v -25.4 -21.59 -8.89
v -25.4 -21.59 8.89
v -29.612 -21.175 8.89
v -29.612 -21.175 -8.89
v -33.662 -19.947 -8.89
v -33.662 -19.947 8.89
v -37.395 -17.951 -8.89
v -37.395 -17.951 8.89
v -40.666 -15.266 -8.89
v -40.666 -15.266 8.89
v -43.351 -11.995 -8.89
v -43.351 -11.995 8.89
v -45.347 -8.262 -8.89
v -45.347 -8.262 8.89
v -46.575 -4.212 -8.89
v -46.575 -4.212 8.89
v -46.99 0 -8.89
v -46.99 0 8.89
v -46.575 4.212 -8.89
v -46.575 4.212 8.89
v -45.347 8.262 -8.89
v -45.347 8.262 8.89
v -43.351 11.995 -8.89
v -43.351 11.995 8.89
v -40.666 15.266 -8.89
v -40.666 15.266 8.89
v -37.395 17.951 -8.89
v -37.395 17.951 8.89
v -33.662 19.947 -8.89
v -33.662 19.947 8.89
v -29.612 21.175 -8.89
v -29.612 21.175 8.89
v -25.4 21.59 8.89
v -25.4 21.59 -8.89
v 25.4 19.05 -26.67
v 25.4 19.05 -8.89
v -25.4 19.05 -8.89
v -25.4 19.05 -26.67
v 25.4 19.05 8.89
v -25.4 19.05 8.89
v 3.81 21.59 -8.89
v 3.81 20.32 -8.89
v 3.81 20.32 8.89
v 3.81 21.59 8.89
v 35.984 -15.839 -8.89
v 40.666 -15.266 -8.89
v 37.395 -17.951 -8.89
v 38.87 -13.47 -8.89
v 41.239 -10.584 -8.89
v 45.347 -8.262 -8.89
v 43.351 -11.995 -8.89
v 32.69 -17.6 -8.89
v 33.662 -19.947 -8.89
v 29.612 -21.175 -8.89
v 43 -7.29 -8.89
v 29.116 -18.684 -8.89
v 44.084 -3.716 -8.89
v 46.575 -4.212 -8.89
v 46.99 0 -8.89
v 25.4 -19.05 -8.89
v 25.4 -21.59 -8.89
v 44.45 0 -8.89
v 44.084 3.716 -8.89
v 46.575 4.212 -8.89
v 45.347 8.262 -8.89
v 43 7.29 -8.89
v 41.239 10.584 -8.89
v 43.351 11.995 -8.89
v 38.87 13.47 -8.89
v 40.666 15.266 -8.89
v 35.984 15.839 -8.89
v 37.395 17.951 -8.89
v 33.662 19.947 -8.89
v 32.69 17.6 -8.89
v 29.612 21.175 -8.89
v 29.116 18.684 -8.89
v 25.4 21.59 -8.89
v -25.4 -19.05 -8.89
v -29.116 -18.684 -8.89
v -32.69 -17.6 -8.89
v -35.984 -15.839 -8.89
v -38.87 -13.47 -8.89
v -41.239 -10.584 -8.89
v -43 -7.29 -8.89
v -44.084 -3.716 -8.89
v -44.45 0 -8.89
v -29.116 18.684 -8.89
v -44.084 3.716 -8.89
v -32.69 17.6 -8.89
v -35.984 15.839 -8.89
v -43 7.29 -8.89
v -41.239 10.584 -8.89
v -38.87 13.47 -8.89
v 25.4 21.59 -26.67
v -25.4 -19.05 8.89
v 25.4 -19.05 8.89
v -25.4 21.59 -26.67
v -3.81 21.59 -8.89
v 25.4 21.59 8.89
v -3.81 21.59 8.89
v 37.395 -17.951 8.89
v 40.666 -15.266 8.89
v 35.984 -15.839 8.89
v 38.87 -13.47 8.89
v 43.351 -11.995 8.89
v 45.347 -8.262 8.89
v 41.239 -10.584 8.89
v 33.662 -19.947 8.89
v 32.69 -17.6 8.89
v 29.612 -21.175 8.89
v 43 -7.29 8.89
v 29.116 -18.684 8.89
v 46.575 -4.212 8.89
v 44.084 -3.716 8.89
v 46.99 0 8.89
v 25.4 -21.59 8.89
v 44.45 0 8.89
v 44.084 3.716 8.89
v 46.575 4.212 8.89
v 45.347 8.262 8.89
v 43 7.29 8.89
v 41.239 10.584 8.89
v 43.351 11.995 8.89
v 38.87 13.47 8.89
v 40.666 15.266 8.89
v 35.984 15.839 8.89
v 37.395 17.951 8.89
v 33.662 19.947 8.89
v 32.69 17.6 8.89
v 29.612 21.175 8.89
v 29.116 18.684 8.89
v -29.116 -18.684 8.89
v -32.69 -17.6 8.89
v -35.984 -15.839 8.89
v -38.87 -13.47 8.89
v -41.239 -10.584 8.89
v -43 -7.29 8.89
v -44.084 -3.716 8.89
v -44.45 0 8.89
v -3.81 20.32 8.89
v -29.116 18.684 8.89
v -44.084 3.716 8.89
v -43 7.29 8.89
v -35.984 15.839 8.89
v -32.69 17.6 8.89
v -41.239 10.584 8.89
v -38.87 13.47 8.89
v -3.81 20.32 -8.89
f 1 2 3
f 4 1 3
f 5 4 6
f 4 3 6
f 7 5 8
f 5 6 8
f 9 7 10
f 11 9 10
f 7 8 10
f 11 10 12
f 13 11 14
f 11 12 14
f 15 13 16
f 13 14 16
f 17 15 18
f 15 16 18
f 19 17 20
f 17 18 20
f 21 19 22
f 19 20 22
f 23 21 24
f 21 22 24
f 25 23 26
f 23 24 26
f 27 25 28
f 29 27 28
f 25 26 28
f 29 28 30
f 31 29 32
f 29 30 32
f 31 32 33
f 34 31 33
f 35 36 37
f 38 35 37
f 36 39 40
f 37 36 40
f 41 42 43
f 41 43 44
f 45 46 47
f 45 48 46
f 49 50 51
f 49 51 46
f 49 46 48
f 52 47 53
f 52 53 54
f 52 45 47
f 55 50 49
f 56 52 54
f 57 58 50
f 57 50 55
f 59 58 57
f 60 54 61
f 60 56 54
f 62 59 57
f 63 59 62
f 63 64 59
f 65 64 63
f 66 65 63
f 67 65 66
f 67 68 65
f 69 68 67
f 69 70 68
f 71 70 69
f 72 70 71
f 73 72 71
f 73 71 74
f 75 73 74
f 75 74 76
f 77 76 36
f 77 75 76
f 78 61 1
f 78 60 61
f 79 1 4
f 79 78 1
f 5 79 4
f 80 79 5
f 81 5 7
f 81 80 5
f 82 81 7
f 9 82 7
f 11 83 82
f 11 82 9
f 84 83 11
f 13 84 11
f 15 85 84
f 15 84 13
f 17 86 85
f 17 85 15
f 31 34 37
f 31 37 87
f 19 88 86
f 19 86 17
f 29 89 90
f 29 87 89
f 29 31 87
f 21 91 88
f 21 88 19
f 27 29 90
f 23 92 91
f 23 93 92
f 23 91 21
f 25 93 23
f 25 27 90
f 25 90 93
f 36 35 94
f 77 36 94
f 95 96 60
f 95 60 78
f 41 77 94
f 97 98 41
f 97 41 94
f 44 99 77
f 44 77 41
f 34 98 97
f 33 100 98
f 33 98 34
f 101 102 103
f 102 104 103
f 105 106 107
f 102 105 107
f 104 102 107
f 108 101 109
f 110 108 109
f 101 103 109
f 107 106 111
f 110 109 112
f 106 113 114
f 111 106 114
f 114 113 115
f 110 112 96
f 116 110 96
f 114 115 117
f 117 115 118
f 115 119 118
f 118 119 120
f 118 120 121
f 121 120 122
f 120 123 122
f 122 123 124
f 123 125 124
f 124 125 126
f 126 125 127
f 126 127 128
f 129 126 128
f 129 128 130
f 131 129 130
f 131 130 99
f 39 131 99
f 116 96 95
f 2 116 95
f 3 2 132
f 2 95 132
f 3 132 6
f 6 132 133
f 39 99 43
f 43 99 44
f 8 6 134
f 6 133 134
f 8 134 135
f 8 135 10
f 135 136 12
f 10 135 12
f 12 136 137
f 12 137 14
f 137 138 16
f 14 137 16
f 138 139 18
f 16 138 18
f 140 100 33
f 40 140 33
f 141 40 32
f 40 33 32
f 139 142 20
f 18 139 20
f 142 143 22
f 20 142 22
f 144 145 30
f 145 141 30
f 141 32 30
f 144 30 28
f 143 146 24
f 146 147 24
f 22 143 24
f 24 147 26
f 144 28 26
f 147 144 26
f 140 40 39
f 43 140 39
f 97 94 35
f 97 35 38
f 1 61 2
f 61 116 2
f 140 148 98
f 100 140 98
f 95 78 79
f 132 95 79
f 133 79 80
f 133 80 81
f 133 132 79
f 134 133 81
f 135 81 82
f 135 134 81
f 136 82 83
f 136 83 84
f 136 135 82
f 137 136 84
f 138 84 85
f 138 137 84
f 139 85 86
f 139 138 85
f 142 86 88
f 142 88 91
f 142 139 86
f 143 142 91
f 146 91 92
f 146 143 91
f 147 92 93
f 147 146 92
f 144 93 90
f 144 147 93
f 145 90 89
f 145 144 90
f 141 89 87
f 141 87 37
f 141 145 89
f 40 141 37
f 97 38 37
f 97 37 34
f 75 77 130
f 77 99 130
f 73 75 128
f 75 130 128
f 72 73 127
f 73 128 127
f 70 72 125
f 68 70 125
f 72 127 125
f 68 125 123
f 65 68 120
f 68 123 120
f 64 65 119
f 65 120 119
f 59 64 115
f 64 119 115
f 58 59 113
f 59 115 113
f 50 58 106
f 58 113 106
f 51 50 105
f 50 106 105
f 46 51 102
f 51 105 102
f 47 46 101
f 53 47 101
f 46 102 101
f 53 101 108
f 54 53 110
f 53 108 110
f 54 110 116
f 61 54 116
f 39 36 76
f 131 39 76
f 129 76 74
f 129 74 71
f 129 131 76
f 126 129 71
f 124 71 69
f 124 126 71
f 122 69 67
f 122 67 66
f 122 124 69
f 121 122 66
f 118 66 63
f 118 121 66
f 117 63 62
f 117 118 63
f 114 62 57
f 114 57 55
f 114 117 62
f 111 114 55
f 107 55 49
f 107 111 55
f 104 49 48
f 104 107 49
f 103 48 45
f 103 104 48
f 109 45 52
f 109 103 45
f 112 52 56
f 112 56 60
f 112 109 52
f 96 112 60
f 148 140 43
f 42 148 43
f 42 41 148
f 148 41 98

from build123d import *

# Parameters (mm, degrees)
BOSS_EXTRUDE1_DEPTH            = 8.89
CUT_EXTRUDE1_REACH             = 10.89
SKETCH3_W                      = 7.62
SKETCH3_H                      = 2.54
CUT_EXTRUDE1_DIRECTION_2_REACH = 10.89
SKETCH4_W                      = 50.8
SKETCH4_H                      = 2.54
BOSS_EXTRUDE2_DEPTH            = 17.78


with BuildPart() as part:
    # Sketch2 → Boss-Extrude1 (new body, symmetric)
    with BuildSketch(Plane.XY):
        with BuildLine():
            Line((-25.4, 21.59), (25.4, 21.59))
            ThreePointArc((25.4, 21.59), (46.99, 0), (25.4, -21.59))
            Line((25.4, -21.59), (-25.4, -21.59))
            ThreePointArc((-25.4, -21.59), (-46.99, 0), (-25.4, 21.59))
        make_face()
        with BuildLine():
            Line((-25.4, 19.05), (25.4, 19.05))
            ThreePointArc((25.4, 19.05), (44.45, 0), (25.4, -19.05))
            Line((25.4, -19.05), (-25.4, -19.05))
            ThreePointArc((-25.4, -19.05), (-44.45, 0), (-25.4, 19.05))
        make_face(mode=Mode.SUBTRACT)
    extrude(amount=BOSS_EXTRUDE1_DEPTH, both=True)

    # Sketch3 → Cut-Extrude1 (cut, up to next)
    with BuildSketch(Plane.XY, mode=Mode.PRIVATE) as cut_extrude1_sk1:
        with Locations((0, 21.59)):
            Rectangle(SKETCH3_W, SKETCH3_H)
    cut_extrude1_tool1 = extrude(cut_extrude1_sk1.sketch, amount=-CUT_EXTRUDE1_REACH, mode=Mode.PRIVATE) & part.part
    add(cut_extrude1_tool1.solids().sort_by_distance((0, 21.59, 0))[0], mode=Mode.SUBTRACT)

    # Sketch3 → Cut-Extrude1 direction 2 (cut, up to next)
    with BuildSketch(Plane.XY, mode=Mode.PRIVATE) as cut_extrude1_direction_2_sk1:
        with Locations((0, 21.59)):
            Rectangle(SKETCH3_W, SKETCH3_H)
    cut_extrude1_direction_2_tool1 = extrude(cut_extrude1_direction_2_sk1.sketch, amount=CUT_EXTRUDE1_DIRECTION_2_REACH, mode=Mode.PRIVATE) & part.part
    add(cut_extrude1_direction_2_tool1.solids().sort_by_distance((0, 21.59, 0))[0], mode=Mode.SUBTRACT)

    # Sketch4 → Boss-Extrude2 (add)
    with BuildSketch(Plane(origin=(0, 0, -8.89), x_dir=(-1, 0, 0), z_dir=(0, 0, -1))):
        with Locations((0, 20.32)):
            Rectangle(SKETCH4_W, SKETCH4_H)
    extrude(amount=BOSS_EXTRUDE2_DEPTH)


solid = part.part
